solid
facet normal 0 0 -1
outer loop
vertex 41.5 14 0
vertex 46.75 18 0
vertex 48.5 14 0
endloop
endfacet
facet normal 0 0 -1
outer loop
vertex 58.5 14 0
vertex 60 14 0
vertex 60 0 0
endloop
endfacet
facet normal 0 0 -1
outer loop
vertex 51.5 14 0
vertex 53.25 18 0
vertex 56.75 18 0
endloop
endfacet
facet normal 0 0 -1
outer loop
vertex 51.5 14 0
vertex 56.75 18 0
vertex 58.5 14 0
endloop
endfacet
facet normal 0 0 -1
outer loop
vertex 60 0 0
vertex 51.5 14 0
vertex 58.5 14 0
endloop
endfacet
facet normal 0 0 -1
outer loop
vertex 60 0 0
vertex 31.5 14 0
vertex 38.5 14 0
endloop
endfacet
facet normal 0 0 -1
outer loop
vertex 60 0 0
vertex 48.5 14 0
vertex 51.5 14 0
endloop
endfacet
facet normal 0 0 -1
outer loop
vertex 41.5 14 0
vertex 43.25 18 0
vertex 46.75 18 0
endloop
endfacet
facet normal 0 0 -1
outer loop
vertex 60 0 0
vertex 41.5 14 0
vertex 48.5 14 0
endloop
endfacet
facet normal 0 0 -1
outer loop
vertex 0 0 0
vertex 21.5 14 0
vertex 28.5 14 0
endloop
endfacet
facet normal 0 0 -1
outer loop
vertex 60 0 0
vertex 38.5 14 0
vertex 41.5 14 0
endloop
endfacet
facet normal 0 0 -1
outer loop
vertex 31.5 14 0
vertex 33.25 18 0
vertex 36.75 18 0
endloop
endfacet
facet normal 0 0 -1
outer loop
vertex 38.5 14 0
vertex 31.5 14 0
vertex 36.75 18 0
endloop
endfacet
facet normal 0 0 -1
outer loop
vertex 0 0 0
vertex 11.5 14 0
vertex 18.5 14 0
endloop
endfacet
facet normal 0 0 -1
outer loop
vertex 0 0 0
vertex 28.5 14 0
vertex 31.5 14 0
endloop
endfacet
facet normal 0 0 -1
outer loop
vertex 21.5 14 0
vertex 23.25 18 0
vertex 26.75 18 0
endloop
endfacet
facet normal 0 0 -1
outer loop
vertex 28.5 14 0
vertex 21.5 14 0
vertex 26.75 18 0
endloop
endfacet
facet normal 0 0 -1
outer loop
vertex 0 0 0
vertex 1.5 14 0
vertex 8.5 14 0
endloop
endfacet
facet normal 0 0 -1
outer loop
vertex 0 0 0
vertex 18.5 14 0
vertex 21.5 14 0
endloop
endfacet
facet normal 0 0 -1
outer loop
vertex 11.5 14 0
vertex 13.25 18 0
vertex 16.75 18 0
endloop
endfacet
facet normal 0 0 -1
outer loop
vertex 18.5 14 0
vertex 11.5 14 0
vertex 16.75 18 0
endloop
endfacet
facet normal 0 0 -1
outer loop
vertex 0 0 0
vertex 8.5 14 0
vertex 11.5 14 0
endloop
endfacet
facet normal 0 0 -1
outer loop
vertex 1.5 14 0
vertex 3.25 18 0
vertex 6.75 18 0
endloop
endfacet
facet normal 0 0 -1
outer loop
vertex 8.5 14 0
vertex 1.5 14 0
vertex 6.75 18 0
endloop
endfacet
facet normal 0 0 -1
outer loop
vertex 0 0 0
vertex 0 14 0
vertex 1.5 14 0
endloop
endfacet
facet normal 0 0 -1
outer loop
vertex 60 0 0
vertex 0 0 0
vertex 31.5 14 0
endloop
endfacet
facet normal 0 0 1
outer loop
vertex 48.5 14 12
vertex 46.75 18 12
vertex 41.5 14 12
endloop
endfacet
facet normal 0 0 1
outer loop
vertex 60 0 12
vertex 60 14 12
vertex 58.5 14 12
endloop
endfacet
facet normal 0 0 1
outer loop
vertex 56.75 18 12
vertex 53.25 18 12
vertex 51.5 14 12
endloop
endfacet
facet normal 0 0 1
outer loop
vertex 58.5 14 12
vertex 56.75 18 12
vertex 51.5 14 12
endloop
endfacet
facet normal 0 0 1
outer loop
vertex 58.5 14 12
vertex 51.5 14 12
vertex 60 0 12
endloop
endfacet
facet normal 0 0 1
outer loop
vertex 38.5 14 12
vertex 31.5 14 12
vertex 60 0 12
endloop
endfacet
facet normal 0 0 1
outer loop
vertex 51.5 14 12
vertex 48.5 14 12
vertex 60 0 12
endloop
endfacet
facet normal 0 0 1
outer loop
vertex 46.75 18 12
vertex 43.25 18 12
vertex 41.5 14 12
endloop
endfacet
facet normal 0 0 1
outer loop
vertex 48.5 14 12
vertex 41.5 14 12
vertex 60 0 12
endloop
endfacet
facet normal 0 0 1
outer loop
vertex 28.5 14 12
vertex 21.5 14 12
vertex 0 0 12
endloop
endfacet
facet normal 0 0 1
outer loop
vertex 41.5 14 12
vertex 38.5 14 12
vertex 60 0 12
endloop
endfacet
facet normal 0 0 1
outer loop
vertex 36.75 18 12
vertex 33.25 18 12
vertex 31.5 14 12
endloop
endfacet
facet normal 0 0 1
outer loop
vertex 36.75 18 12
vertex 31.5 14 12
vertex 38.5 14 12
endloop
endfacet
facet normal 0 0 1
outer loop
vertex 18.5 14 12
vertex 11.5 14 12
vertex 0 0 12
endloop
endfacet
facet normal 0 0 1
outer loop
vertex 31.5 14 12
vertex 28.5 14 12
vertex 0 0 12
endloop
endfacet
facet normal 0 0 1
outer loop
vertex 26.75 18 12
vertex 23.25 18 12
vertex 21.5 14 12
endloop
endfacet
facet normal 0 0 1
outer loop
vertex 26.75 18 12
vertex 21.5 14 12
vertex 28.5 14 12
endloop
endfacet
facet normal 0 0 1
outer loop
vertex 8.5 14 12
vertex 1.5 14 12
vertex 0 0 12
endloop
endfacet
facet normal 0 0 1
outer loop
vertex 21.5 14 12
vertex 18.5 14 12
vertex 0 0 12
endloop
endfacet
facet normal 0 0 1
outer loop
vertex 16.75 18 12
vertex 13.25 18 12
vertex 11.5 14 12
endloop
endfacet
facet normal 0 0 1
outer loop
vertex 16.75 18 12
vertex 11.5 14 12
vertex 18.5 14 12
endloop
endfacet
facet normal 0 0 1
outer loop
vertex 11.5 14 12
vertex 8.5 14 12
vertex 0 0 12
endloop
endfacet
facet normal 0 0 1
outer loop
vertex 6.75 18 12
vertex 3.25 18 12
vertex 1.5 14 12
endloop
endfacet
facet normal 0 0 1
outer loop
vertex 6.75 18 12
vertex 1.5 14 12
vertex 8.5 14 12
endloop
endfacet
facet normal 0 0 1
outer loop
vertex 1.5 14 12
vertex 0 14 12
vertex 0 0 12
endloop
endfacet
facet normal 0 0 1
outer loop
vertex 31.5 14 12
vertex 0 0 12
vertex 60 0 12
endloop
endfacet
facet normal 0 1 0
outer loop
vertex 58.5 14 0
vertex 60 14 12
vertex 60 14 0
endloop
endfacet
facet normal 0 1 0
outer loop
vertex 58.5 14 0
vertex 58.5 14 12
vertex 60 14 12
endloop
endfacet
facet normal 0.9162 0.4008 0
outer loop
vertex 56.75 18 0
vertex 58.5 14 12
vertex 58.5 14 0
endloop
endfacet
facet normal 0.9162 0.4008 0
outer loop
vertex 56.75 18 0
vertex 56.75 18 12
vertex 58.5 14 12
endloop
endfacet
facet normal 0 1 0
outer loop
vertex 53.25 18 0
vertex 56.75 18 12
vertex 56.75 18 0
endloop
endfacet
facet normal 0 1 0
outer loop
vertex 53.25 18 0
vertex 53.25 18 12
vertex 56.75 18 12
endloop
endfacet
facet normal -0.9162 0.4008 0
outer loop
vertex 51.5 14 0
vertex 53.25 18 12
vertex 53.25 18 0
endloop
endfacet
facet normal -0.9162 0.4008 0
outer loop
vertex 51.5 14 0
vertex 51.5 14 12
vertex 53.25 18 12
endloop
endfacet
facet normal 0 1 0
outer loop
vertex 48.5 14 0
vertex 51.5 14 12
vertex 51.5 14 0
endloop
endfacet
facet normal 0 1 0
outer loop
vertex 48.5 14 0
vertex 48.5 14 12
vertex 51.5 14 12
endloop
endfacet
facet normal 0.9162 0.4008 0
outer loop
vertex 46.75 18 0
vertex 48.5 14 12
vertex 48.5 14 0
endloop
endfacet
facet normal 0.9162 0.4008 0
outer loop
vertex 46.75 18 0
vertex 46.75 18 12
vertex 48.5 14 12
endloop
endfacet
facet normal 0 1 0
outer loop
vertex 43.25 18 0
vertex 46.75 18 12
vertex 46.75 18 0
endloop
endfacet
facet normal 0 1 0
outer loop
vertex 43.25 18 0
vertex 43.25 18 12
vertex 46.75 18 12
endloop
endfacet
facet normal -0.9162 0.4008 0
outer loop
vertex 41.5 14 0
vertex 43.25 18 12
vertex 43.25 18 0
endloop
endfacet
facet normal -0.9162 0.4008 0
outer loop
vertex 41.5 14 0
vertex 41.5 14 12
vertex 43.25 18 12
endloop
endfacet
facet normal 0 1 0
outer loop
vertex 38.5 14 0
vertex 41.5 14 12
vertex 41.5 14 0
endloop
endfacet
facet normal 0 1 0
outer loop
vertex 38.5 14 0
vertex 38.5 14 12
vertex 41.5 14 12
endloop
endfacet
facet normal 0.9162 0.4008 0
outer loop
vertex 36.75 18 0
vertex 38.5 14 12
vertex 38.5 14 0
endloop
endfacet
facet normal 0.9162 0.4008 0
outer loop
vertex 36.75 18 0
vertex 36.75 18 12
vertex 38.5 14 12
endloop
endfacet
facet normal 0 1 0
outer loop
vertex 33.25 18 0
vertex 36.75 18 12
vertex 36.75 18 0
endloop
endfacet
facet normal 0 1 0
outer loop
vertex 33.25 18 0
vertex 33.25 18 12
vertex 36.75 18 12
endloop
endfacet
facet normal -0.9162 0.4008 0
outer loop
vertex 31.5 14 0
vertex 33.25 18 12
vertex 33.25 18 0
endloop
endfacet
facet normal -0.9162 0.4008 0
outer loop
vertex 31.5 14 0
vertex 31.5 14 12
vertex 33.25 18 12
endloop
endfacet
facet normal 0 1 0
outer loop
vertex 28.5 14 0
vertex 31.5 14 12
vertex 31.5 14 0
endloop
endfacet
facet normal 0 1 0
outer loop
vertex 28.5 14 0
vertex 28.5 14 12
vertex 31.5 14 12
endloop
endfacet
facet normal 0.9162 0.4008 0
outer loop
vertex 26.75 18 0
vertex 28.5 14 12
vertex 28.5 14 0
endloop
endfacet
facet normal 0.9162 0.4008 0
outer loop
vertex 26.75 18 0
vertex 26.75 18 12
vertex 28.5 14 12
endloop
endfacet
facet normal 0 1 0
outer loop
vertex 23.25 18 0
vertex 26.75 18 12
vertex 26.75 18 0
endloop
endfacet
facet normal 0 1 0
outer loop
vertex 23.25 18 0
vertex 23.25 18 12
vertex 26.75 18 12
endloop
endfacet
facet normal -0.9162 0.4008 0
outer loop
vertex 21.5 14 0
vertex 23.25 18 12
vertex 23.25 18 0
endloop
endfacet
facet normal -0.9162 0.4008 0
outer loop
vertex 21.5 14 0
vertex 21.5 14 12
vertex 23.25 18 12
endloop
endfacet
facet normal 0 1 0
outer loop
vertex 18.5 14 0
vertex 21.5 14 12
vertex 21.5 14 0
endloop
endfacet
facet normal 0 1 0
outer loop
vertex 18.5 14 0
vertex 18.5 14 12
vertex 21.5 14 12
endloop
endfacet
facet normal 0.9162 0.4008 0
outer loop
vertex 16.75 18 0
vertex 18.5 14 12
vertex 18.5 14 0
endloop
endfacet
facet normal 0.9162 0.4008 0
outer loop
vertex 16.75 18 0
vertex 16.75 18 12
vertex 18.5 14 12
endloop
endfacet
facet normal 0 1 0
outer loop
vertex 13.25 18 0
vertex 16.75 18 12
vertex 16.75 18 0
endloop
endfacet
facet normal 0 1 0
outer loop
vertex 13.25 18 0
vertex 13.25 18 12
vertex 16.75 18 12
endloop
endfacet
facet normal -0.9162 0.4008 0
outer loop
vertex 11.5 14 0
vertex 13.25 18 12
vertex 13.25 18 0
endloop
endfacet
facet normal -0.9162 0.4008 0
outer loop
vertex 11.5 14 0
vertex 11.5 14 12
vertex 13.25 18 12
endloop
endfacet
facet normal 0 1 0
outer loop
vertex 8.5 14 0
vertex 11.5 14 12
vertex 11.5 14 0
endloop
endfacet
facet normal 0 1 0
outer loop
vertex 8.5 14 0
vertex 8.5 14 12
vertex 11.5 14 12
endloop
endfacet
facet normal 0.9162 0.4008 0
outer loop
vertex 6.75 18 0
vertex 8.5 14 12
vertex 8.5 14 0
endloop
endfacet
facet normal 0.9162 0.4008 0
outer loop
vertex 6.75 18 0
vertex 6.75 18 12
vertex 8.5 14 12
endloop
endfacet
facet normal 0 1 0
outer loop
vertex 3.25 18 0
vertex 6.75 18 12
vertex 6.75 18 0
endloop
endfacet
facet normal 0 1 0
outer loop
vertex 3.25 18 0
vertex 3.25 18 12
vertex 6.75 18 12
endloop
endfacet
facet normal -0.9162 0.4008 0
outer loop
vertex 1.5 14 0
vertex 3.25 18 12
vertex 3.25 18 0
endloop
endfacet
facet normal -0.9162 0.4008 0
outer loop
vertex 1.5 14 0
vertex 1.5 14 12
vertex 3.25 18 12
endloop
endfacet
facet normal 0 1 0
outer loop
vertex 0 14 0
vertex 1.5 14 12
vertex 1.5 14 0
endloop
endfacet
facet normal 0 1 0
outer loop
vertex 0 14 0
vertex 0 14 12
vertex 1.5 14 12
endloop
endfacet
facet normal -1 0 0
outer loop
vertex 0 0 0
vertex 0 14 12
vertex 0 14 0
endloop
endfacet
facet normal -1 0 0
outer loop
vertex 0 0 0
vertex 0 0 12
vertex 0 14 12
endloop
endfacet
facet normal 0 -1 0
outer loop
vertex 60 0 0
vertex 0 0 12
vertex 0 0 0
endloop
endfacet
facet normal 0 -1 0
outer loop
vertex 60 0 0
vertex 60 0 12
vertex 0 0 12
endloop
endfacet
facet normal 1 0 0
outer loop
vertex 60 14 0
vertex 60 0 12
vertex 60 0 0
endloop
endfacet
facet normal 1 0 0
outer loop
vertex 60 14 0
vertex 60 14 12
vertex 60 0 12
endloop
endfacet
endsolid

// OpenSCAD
$fn = 32;

// ----------------------------------------------------------------------
// Gear rack: 6 teeth, pitch 10 mm
// ----------------------------------------------------------------------

// --- parameters (mm) ---
teeth = 6;                // number of teeth
pitch = 10;               // tooth pitch, X
root_w = 7;               // tooth width at the root
tip_w = 3.5;              // tooth width at the tip
base_h = 14;              // rack body height, Y
tooth_h = 4;              // tooth height above the body
plate_t = 12;             // rack width, Z (extrusion height)
fit_tol = 0.05;           // declared fit tolerance (prompt contract)
free_tol = 0.2;           // declared free tolerance (prompt contract)

rack_l = teeth * pitch;  // overall length
total_h = base_h + tooth_h;  // overall height

profile = [[0, 0], [60, 0], [60, 14], [58.5, 14], [56.75, 18], [53.25, 18], [51.5, 14], [48.5, 14], [46.75, 18], [43.25, 18], [41.5, 14], [38.5, 14], [36.75, 18], [33.25, 18], [31.5, 14], [28.5, 14], [26.75, 18], [23.25, 18], [21.5, 14], [18.5, 14], [16.75, 18], [13.25, 18], [11.5, 14], [8.5, 14], [6.75, 18], [3.25, 18], [1.5, 14], [0, 14]];  // primary outline, 28 points, counter clockwise

// --- the one profile operation ---
linear_extrude(height = plate_t) polygon(points = profile);
